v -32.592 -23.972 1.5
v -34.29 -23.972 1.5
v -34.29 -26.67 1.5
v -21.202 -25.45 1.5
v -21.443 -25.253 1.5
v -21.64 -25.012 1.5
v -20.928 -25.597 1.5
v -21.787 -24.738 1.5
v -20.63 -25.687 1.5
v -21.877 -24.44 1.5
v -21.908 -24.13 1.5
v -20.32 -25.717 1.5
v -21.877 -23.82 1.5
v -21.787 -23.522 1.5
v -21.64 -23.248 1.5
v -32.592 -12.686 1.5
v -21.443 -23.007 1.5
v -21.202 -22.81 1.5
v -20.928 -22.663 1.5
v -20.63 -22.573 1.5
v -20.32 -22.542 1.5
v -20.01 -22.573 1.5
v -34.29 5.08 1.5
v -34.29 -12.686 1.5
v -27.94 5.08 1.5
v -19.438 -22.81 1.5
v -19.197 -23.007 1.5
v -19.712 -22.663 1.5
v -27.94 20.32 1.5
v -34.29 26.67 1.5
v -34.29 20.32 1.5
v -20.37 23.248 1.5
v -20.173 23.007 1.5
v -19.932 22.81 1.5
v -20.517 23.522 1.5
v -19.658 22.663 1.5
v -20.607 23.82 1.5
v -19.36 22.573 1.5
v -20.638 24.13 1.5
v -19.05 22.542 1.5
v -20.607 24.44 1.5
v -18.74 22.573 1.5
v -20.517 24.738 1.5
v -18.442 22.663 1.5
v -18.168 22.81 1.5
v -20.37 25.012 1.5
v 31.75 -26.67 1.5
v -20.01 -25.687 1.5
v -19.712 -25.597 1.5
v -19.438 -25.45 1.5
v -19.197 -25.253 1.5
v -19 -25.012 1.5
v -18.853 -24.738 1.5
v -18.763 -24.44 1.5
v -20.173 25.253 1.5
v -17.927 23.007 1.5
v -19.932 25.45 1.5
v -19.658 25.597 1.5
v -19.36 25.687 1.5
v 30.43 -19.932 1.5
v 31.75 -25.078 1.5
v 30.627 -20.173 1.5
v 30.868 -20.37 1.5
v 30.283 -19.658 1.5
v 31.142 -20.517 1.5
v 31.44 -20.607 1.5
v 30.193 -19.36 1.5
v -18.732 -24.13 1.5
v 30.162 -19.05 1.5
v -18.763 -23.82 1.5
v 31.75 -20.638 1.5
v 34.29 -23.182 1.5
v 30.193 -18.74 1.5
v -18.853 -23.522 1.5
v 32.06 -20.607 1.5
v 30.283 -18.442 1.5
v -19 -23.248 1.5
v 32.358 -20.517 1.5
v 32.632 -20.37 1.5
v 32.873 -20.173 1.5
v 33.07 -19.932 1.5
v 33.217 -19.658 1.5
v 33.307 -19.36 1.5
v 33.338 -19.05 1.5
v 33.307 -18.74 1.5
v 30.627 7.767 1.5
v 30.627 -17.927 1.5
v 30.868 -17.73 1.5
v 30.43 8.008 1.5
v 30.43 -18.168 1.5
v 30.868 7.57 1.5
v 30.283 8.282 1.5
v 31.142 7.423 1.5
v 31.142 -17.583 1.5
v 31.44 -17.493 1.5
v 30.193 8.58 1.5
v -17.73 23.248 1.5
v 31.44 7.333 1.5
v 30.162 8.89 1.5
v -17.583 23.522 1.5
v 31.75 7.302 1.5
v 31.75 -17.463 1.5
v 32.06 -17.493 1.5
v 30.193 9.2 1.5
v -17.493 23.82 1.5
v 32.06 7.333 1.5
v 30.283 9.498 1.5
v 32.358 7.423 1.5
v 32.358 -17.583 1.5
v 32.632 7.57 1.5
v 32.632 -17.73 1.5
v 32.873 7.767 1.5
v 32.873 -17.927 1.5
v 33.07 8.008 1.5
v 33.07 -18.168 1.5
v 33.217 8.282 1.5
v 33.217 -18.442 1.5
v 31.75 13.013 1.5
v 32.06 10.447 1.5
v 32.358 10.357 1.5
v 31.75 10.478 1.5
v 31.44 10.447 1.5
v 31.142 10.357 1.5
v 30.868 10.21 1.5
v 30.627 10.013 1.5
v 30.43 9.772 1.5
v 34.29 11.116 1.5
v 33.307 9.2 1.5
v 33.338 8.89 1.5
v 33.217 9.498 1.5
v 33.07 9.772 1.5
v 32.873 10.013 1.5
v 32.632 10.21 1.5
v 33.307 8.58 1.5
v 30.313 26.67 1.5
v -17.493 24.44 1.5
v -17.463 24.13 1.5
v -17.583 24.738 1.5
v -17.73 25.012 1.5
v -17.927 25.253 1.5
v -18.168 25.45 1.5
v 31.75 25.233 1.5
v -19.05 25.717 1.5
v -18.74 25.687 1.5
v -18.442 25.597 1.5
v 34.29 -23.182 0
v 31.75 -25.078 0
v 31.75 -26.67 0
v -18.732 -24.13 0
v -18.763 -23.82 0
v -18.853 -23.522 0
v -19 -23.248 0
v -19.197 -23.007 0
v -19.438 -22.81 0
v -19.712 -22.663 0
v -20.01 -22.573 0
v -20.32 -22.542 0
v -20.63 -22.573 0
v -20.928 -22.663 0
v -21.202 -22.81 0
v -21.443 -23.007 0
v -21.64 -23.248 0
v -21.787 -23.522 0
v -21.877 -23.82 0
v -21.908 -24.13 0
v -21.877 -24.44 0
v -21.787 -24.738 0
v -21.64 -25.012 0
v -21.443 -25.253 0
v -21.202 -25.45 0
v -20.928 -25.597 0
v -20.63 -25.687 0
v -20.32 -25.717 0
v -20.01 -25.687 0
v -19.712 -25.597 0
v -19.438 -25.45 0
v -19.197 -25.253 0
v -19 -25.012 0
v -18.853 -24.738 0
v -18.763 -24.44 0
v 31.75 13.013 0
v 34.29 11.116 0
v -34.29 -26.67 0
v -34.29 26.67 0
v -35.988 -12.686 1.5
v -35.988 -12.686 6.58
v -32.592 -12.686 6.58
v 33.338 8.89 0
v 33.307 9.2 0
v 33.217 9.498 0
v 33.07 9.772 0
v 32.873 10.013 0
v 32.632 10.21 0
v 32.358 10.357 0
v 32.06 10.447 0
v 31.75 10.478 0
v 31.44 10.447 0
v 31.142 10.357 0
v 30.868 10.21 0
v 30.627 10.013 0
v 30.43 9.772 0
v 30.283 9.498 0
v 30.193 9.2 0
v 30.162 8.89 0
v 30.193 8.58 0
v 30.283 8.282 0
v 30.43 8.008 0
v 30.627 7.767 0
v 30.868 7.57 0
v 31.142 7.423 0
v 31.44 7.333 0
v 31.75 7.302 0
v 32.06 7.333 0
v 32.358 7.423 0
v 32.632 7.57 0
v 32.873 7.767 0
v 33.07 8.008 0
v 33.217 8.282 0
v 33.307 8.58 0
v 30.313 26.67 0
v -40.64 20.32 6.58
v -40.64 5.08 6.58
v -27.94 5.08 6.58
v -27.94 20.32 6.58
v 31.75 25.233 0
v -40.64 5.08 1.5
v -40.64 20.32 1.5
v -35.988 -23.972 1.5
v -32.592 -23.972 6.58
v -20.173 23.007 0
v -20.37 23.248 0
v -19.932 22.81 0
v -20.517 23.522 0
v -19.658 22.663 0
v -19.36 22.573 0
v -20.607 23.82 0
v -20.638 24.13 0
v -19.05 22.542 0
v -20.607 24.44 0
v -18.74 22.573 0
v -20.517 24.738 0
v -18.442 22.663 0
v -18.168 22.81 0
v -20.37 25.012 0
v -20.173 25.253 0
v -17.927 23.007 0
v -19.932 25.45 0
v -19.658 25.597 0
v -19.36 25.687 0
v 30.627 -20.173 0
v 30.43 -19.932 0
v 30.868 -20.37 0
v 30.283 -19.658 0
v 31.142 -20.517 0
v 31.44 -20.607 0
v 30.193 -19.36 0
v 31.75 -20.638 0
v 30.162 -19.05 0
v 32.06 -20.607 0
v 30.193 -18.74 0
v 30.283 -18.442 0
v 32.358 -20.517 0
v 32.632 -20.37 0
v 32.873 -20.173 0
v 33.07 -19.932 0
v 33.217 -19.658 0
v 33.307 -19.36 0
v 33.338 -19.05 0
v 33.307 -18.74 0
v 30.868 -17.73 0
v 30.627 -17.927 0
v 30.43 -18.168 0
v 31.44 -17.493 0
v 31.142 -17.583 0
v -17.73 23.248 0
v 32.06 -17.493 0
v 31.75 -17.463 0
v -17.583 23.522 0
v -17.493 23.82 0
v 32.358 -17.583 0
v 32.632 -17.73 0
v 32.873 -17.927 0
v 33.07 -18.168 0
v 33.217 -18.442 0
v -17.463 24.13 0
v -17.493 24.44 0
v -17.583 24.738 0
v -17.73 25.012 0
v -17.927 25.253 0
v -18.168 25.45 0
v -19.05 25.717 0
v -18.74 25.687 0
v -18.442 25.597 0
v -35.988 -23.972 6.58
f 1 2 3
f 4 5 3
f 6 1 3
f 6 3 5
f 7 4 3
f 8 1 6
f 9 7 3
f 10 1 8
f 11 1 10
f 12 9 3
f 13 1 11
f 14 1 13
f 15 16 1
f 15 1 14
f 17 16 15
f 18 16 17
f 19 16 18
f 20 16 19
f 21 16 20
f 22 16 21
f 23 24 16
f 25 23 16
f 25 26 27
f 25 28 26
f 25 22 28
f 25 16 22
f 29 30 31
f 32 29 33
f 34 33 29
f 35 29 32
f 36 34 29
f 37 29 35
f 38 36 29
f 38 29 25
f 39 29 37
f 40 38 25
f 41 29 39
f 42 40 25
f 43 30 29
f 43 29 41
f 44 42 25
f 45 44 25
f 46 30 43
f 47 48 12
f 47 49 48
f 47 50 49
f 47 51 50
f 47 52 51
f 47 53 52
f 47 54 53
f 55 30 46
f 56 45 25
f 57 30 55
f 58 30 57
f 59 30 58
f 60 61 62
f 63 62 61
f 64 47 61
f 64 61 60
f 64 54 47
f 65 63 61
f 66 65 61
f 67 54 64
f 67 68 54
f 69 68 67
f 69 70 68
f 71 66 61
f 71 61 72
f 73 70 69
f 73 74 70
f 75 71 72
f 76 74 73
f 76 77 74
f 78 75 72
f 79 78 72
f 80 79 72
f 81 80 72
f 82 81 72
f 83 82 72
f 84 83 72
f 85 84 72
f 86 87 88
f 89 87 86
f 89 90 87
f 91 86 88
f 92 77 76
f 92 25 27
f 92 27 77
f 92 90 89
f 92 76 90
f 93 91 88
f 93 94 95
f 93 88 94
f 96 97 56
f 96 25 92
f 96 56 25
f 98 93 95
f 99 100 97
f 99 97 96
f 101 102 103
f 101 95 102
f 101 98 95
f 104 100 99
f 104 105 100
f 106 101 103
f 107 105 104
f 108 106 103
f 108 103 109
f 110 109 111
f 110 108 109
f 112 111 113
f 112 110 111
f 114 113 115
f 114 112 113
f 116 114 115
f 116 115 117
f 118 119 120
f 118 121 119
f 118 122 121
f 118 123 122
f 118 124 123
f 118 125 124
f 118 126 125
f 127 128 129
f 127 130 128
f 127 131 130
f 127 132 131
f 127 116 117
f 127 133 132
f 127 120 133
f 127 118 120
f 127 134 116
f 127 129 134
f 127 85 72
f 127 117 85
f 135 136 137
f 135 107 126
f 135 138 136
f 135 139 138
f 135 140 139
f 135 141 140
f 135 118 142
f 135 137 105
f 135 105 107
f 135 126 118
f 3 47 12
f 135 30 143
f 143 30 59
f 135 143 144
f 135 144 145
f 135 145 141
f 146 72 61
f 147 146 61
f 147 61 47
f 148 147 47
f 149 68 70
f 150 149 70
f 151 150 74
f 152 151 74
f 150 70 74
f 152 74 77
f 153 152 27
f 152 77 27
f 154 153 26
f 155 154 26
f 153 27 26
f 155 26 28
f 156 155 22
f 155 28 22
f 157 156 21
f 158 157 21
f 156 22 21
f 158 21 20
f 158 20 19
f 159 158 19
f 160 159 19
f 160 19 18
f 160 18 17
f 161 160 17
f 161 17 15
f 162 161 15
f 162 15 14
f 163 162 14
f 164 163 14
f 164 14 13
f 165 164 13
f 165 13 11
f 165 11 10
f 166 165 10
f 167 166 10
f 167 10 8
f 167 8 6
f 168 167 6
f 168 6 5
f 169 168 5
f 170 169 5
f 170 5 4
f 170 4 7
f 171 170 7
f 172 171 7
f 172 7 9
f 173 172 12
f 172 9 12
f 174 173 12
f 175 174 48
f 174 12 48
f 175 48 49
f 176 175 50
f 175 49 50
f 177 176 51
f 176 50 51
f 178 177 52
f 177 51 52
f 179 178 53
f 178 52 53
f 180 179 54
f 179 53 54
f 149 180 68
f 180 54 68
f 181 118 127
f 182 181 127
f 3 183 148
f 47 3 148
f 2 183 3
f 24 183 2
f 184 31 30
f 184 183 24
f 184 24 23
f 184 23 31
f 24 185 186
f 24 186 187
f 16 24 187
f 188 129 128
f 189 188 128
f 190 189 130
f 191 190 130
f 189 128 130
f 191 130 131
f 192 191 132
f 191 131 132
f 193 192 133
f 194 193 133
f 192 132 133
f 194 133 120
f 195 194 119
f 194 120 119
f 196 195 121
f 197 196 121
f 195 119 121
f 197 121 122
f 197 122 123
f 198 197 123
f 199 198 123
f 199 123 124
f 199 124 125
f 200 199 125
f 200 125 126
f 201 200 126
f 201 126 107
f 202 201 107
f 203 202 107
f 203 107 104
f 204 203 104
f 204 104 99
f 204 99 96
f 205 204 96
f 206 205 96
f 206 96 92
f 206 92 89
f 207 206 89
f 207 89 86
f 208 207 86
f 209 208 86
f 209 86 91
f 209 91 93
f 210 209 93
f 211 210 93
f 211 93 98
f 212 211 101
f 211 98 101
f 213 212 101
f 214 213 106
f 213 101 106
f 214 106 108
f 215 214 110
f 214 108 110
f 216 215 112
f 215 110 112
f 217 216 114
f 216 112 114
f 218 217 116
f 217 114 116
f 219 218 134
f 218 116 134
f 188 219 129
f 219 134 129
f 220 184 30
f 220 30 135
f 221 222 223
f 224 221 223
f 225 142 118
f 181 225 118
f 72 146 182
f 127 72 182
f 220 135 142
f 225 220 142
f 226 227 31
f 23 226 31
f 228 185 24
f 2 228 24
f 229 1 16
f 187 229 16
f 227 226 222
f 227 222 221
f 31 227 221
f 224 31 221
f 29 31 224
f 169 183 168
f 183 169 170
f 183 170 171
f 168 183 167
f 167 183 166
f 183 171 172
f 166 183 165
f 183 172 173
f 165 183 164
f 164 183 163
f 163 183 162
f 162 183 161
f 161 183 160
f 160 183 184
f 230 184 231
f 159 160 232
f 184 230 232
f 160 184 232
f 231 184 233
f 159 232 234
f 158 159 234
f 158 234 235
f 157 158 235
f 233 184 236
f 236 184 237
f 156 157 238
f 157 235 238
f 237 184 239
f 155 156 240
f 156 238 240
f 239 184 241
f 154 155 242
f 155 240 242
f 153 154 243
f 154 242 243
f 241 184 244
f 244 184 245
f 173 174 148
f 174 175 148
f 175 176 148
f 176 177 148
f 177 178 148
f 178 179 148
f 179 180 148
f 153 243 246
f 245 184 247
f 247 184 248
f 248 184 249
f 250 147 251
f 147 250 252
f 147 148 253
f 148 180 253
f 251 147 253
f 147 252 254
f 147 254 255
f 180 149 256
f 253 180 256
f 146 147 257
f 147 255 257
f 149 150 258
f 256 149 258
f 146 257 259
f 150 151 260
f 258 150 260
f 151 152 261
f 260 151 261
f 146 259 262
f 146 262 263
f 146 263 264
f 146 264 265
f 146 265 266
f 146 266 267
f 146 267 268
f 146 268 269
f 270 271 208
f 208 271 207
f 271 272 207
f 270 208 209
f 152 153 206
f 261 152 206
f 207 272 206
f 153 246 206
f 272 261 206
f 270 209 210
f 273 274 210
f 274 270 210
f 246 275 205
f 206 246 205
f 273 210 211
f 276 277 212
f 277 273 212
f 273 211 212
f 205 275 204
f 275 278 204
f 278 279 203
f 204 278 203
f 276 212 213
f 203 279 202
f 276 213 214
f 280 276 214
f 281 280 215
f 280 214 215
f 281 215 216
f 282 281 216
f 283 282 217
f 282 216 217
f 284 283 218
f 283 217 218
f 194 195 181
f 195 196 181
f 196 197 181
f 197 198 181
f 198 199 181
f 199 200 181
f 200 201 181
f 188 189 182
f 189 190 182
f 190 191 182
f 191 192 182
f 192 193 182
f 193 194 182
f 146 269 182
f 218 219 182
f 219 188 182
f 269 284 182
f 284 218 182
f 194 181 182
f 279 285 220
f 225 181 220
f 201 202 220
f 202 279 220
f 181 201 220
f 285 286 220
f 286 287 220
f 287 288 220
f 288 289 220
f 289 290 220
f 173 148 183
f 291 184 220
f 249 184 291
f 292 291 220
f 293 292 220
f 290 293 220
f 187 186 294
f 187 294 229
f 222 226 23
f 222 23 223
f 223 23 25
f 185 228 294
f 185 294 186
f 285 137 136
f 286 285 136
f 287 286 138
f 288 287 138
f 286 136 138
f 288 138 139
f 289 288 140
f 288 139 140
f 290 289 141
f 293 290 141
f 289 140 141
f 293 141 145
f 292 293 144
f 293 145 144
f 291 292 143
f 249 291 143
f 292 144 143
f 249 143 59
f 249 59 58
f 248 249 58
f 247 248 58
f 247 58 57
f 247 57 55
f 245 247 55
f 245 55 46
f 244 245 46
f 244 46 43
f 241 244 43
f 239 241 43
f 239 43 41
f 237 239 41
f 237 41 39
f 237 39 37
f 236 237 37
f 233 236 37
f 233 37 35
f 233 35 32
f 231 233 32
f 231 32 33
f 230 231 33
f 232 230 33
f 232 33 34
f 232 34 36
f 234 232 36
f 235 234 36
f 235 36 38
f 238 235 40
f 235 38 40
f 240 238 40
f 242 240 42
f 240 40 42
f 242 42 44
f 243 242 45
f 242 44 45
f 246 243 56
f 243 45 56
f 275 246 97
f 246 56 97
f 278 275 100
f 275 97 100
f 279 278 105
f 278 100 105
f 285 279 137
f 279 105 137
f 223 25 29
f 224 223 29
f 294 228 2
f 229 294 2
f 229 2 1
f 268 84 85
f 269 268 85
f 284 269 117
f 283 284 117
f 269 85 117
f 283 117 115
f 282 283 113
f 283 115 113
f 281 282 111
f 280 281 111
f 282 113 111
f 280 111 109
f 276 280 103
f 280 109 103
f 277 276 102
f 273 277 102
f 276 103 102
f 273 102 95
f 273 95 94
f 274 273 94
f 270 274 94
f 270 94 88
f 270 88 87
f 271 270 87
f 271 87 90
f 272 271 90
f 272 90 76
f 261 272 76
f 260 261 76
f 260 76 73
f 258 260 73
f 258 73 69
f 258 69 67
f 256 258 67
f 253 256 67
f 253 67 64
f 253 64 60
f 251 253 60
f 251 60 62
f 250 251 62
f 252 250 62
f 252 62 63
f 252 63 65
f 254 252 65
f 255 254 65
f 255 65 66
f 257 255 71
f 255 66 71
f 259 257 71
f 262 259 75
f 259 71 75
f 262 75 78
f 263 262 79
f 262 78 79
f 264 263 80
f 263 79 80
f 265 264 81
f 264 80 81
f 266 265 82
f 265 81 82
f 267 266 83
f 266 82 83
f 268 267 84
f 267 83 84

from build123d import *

# Parameters (mm, degrees)
SKETCH1_W           = 68.58
SKETCH1_H           = 53.34
BOSS_EXTRUDE1_DEPTH = 1.5
SKETCH2_W           = 12.7
SKETCH2_H           = 15.24
SKETCH2_W_2         = 3.39503639
SKETCH2_H_2         = 11.2855496
BOSS_EXTRUDE2_DEPTH = 5.08
SKETCH3_R           = 1.5875
CUT_EXTRUDE1_DEPTH  = 10.16
CUT_EXTRUDE2_DEPTH  = 2.5


with BuildPart() as part:
    # Sketch1 → Boss-Extrude1 (new body)
    with BuildSketch(Plane.XY):
        Rectangle(SKETCH1_W, SKETCH1_H)
    extrude(amount=BOSS_EXTRUDE1_DEPTH)

    # Sketch2 → Boss-Extrude2 (add)
    with BuildSketch(Plane.XY.offset(1.5)):
        with Locations((-34.29, 12.7)):
            Rectangle(SKETCH2_W, SKETCH2_H)
        with Locations((-34.29, -18.328779787)):
            Rectangle(SKETCH2_W_2, SKETCH2_H_2)
    extrude(amount=BOSS_EXTRUDE2_DEPTH)

    # Sketch3 → Cut-Extrude1 (cut)
    with BuildSketch(Plane.XY.offset(1.5)):
        with Locations((-19.05, 24.13)):
            Circle(SKETCH3_R)
        with Locations((-20.32, -24.13)):
            Circle(SKETCH3_R)
        with Locations((31.75, 8.89)):
            Circle(SKETCH3_R)
        with Locations((31.75, -19.05)):
            Circle(SKETCH3_R)
    extrude(amount=-CUT_EXTRUDE1_DEPTH, mode=Mode.SUBTRACT)

    # Sketch4 → Cut-Extrude2 (cut, through all)
    with BuildSketch(Plane.XY.offset(1.5)):
        Polygon((30.313159021, 26.67), (31.75, 25.233159021), (31.75, 13.012702255), (34.29, 11.115796447), (34.29, 26.67), align=None)
        Polygon((34.29, -23.181547096), (31.75, -25.078452904), (31.75, -26.67), (34.29, -26.67), align=None)
    extrude(amount=-CUT_EXTRUDE2_DEPTH, mode=Mode.SUBTRACT)


solid = part.part
